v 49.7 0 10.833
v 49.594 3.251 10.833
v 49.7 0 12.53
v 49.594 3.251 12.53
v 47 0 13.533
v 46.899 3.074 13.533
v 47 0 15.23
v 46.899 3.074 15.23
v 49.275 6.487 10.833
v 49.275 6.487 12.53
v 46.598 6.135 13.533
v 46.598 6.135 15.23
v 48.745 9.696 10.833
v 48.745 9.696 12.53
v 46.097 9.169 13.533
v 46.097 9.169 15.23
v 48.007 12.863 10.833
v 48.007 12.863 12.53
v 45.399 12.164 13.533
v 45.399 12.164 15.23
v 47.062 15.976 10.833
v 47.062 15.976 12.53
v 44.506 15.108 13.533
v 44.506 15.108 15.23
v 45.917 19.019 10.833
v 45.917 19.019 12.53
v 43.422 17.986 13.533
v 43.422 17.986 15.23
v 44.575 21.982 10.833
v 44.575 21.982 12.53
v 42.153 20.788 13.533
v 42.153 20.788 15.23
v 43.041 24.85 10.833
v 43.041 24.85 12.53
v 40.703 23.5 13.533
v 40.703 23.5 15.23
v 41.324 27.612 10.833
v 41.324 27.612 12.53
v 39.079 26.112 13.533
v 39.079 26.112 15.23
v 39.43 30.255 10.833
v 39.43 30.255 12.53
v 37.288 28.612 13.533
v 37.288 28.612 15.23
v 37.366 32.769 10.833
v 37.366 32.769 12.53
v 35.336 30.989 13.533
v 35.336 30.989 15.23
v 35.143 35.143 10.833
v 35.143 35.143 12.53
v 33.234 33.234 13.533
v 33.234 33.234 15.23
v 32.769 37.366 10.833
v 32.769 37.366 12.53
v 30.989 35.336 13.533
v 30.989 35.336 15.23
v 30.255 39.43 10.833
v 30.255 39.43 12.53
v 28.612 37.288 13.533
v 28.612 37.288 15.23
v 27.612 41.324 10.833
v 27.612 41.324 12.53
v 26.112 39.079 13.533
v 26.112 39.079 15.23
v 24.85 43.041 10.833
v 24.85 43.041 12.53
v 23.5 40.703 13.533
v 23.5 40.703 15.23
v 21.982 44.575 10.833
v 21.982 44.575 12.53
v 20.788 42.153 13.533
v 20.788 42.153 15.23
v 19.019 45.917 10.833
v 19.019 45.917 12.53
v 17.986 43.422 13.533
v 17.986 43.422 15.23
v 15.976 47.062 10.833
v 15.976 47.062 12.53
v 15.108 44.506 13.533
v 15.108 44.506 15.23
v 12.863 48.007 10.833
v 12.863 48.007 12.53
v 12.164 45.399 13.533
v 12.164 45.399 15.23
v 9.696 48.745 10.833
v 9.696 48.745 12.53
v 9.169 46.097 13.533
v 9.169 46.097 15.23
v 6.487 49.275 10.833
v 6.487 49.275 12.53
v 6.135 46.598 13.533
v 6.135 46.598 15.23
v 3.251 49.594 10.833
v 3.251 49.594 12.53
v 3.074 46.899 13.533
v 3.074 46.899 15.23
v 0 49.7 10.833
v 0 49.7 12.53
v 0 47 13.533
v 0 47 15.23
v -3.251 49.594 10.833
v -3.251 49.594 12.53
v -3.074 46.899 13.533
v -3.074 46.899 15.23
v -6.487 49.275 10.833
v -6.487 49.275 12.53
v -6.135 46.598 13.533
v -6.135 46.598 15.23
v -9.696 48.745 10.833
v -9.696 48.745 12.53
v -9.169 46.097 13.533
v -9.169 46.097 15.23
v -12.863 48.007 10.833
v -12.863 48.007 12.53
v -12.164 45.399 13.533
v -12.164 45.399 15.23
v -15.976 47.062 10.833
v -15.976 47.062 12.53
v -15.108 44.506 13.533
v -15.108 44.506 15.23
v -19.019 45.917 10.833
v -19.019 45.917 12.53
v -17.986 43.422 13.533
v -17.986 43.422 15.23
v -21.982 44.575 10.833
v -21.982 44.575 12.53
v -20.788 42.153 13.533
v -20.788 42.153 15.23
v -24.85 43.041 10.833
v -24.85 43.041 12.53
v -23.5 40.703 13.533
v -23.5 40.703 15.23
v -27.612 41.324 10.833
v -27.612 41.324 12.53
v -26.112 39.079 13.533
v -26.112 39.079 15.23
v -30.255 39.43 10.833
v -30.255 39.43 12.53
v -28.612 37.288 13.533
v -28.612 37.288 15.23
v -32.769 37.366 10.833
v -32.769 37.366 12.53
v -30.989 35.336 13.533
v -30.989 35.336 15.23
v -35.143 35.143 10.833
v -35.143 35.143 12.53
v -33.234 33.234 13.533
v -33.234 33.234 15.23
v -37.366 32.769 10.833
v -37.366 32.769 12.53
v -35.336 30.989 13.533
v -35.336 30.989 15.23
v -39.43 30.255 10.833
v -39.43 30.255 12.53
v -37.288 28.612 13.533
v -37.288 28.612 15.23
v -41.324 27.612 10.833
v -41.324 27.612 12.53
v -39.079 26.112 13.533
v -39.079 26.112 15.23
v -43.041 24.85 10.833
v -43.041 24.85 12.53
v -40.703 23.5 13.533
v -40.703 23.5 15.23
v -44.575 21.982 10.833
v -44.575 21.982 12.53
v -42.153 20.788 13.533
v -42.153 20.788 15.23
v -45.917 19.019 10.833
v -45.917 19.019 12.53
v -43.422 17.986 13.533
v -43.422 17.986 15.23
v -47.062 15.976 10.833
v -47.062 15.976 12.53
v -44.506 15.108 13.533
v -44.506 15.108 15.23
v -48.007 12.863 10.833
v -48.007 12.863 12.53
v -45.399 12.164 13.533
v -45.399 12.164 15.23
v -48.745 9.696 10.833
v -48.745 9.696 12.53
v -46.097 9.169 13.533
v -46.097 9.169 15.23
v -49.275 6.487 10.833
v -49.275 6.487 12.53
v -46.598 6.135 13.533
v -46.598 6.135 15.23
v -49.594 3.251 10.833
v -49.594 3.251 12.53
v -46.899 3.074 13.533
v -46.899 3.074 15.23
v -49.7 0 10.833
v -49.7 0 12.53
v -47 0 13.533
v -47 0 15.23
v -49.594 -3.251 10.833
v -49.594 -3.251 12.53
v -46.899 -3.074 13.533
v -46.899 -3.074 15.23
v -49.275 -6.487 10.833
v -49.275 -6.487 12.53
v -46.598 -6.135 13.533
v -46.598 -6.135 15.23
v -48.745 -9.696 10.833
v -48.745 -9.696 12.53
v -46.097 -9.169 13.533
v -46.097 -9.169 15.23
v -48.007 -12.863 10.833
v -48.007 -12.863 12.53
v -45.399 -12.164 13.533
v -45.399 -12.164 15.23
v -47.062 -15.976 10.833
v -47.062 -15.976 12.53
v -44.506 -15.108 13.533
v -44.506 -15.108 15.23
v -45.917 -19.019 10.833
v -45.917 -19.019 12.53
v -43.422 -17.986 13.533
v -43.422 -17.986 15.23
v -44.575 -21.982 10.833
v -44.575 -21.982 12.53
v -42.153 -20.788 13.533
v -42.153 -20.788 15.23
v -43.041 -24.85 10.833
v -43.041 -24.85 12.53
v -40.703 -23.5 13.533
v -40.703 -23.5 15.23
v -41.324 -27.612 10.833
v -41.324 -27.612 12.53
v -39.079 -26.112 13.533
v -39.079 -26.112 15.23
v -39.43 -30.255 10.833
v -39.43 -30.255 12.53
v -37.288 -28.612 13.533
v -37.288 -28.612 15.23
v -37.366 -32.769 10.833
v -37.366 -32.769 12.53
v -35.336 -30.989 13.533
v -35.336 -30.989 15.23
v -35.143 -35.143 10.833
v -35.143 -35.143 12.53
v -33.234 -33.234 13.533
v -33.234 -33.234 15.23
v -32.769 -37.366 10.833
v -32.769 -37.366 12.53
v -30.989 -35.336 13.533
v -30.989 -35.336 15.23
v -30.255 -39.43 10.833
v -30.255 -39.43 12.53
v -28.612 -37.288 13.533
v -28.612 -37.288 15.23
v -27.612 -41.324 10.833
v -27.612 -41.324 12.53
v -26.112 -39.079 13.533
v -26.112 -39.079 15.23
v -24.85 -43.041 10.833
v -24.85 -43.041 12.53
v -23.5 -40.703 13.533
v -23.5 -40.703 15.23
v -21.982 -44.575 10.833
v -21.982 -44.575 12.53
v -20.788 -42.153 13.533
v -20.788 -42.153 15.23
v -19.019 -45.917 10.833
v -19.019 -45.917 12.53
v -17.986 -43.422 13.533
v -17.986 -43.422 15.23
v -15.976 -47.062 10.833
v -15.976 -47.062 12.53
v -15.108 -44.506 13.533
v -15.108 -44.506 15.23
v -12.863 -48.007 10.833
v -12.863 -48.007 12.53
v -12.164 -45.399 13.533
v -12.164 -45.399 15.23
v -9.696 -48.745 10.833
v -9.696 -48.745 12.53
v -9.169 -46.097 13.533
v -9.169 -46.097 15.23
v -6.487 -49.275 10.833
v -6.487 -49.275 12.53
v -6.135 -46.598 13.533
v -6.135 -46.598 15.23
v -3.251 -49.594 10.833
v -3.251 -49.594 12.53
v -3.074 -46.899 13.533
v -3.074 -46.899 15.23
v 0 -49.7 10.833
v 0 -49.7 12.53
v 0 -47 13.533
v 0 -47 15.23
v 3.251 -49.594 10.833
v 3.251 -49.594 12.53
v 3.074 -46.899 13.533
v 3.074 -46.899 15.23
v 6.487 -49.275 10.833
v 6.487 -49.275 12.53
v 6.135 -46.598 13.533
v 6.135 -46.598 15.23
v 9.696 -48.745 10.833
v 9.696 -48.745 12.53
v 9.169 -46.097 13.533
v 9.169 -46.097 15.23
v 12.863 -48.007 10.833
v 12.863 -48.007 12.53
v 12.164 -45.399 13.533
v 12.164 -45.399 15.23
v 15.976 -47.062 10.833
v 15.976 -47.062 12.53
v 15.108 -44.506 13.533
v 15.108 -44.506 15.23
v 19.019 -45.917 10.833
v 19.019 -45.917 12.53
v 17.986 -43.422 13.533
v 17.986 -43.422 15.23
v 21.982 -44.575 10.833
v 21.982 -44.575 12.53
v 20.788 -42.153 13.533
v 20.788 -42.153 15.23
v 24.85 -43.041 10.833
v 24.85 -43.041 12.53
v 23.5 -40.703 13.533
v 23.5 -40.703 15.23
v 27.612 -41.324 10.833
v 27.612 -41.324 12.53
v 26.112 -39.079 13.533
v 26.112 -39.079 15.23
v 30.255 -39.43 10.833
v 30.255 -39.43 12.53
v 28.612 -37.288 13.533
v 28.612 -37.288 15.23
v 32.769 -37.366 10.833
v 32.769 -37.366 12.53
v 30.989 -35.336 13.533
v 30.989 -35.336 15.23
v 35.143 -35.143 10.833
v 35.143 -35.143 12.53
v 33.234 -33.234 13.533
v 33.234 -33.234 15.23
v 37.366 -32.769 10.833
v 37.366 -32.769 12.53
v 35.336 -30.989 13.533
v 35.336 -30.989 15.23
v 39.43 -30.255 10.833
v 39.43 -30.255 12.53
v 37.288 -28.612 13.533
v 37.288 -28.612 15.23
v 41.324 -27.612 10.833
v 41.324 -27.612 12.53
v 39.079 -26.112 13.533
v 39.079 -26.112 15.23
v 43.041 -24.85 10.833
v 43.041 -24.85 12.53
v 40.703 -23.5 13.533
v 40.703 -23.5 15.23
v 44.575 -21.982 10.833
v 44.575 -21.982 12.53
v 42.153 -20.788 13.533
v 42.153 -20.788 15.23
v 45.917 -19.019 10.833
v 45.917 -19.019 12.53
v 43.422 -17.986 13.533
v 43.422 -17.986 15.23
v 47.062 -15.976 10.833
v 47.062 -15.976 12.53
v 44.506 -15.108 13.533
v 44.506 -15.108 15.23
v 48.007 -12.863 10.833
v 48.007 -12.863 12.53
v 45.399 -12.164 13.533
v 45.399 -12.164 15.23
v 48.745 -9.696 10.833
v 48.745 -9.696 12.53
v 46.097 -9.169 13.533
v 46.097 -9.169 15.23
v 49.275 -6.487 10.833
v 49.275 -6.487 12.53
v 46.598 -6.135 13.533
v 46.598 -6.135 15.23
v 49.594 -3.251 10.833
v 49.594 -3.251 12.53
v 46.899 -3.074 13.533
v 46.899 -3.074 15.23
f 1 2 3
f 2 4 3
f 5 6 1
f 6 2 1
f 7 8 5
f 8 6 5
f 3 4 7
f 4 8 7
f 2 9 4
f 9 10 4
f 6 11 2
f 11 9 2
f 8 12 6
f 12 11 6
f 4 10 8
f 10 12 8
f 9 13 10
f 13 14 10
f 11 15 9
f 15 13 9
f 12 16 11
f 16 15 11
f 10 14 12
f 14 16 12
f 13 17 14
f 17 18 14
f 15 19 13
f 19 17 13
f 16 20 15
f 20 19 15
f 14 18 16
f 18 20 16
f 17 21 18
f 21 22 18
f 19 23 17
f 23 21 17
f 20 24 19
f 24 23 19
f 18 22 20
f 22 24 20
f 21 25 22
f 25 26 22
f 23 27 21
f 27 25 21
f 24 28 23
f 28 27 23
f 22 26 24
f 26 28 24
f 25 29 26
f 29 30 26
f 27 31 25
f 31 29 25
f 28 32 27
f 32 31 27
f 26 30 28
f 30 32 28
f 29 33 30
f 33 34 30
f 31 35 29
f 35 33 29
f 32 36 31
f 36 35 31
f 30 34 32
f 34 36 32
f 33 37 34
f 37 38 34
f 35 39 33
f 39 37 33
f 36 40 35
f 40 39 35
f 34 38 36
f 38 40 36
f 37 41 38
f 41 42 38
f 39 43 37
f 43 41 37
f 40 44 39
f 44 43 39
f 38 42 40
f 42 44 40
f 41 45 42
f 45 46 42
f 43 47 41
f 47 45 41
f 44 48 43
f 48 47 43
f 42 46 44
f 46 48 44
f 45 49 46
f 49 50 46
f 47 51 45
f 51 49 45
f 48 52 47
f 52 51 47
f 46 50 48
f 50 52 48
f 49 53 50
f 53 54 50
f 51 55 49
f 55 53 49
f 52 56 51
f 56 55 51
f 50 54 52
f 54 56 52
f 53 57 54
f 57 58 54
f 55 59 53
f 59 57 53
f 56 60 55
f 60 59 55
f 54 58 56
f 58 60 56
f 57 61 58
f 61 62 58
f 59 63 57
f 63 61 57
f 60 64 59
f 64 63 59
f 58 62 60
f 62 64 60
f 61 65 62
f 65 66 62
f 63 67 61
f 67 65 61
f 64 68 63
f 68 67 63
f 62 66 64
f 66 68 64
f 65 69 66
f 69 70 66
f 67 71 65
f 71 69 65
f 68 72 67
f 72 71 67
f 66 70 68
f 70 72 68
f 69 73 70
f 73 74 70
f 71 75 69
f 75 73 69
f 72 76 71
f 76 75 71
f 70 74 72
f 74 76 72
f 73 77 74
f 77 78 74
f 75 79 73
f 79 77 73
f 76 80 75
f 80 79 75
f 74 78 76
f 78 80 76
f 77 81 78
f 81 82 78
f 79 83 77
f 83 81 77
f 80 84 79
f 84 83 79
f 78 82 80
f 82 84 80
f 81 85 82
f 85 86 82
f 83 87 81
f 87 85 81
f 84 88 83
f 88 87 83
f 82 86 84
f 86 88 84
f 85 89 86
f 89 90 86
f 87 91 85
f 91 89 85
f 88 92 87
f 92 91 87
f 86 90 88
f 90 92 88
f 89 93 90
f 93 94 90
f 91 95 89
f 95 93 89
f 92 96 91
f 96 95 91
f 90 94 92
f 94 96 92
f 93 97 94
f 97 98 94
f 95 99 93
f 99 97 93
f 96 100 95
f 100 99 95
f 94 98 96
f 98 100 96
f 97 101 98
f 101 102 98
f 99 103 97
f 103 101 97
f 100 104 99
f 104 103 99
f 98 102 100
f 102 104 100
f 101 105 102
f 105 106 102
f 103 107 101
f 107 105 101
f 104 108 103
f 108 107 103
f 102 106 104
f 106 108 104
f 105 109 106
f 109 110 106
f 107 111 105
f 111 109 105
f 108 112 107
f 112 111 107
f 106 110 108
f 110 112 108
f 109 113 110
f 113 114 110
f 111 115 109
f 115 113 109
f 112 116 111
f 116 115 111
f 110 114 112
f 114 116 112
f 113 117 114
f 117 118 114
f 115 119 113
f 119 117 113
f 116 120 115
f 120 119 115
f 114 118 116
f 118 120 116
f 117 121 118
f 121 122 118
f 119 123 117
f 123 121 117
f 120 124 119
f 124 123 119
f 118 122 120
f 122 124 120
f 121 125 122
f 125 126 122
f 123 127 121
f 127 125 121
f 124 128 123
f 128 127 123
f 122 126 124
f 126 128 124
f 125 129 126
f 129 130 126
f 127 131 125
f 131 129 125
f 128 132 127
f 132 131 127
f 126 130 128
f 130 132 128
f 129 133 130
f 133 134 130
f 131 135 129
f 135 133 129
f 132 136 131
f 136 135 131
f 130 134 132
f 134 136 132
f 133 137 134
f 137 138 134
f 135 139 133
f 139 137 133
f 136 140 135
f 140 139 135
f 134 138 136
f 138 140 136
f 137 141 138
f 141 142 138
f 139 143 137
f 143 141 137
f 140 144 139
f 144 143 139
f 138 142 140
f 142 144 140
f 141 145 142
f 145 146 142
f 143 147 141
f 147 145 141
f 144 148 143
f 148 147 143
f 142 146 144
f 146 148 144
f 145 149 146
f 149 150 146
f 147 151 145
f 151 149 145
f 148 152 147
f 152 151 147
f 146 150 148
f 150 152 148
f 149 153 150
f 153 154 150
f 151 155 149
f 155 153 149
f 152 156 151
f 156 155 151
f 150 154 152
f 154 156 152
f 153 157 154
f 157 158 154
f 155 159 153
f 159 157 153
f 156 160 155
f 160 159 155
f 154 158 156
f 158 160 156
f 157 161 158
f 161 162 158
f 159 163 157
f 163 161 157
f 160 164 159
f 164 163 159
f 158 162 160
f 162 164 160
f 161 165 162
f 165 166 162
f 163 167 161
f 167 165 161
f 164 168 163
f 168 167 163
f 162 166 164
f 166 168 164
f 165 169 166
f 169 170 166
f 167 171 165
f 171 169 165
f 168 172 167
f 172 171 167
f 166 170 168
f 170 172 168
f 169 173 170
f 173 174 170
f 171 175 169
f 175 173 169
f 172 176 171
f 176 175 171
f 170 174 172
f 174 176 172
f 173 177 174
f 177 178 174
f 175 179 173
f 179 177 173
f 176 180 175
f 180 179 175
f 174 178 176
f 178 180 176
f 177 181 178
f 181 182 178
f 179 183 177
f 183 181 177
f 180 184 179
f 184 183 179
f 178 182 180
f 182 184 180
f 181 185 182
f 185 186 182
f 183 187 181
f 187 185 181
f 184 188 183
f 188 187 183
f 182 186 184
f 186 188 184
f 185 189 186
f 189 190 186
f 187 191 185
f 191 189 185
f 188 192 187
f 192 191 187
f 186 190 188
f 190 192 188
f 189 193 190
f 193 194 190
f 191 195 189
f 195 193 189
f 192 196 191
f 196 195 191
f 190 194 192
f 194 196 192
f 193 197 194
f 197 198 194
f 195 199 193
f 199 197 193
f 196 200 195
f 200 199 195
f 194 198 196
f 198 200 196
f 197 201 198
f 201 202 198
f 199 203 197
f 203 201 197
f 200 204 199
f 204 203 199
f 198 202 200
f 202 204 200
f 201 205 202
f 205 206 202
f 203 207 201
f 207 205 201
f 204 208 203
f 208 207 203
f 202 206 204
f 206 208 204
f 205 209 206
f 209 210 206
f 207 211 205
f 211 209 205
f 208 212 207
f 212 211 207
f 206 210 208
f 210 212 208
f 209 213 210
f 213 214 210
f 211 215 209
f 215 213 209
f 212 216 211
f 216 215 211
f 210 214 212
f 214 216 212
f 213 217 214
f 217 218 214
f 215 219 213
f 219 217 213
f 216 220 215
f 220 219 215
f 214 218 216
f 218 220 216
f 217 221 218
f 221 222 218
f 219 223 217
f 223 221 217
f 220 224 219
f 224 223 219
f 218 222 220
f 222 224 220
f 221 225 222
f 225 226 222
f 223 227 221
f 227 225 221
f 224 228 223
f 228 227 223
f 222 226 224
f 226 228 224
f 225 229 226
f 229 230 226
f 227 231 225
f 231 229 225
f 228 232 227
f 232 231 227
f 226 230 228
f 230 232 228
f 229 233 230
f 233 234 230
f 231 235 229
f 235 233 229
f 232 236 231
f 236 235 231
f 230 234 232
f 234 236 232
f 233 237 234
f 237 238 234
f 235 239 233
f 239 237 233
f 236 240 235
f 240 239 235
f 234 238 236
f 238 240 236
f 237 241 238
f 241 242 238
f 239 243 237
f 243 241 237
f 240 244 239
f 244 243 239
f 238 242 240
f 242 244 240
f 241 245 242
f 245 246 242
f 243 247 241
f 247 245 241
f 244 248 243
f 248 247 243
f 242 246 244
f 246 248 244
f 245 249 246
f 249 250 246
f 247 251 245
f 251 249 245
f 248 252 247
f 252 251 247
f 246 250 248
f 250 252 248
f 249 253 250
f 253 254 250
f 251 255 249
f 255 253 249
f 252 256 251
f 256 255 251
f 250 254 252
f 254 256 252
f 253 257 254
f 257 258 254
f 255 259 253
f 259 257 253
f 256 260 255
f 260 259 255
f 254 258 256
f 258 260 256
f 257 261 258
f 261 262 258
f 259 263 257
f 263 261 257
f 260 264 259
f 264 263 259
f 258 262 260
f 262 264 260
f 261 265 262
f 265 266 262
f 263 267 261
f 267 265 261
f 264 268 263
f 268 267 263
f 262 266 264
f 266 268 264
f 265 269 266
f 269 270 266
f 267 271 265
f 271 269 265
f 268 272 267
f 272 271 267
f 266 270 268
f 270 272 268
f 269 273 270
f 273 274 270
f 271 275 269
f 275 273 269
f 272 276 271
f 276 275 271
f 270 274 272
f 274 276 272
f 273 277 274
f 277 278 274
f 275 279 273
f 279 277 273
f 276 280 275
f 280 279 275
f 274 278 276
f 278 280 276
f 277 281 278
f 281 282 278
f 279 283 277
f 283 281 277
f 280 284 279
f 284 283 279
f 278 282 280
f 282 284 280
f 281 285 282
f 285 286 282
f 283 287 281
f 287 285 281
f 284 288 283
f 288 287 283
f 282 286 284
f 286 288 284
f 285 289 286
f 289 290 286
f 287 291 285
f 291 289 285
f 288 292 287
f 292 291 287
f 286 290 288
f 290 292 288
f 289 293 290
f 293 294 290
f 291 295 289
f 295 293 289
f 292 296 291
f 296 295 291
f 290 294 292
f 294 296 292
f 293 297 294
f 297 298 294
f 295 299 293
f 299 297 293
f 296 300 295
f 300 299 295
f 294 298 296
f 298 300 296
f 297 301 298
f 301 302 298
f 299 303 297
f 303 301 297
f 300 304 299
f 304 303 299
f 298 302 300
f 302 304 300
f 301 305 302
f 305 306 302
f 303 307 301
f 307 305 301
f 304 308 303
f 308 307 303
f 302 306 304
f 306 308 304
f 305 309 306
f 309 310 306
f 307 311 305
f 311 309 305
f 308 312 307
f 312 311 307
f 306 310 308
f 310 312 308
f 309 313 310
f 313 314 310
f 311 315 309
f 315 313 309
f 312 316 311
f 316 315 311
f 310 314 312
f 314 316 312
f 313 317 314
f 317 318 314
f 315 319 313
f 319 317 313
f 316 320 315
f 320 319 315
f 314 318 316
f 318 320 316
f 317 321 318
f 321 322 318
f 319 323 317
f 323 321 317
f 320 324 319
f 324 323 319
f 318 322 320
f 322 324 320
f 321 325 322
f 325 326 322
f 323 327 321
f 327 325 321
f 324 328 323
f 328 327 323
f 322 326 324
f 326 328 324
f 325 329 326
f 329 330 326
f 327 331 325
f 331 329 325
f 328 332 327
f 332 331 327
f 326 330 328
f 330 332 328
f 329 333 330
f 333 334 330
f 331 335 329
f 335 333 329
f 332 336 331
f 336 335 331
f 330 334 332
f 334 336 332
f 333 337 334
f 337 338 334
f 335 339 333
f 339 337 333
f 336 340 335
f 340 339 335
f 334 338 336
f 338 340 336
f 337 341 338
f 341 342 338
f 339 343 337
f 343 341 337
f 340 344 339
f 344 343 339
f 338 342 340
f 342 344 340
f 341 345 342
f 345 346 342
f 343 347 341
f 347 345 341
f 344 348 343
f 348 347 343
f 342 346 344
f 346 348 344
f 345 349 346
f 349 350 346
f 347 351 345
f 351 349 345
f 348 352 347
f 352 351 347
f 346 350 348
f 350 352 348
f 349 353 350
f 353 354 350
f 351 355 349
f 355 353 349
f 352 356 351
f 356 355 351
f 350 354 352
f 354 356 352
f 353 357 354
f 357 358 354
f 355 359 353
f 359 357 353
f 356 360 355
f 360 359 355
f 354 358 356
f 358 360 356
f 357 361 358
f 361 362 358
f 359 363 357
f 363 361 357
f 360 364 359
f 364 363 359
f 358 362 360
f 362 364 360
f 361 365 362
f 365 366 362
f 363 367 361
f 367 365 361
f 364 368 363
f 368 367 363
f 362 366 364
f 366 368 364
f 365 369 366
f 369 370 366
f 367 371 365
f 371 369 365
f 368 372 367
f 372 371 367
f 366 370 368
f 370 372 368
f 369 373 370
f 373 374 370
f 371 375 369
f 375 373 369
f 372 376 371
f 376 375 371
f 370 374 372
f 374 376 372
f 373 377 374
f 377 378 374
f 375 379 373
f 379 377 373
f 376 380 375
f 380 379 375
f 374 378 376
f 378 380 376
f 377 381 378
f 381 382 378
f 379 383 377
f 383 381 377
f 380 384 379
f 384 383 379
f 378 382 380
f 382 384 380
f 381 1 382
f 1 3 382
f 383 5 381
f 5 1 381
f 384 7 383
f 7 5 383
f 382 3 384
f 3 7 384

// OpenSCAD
include <../lib/servo-duct-manifold-lib.scad>;
$fn = 96;
venturi_gasket();
